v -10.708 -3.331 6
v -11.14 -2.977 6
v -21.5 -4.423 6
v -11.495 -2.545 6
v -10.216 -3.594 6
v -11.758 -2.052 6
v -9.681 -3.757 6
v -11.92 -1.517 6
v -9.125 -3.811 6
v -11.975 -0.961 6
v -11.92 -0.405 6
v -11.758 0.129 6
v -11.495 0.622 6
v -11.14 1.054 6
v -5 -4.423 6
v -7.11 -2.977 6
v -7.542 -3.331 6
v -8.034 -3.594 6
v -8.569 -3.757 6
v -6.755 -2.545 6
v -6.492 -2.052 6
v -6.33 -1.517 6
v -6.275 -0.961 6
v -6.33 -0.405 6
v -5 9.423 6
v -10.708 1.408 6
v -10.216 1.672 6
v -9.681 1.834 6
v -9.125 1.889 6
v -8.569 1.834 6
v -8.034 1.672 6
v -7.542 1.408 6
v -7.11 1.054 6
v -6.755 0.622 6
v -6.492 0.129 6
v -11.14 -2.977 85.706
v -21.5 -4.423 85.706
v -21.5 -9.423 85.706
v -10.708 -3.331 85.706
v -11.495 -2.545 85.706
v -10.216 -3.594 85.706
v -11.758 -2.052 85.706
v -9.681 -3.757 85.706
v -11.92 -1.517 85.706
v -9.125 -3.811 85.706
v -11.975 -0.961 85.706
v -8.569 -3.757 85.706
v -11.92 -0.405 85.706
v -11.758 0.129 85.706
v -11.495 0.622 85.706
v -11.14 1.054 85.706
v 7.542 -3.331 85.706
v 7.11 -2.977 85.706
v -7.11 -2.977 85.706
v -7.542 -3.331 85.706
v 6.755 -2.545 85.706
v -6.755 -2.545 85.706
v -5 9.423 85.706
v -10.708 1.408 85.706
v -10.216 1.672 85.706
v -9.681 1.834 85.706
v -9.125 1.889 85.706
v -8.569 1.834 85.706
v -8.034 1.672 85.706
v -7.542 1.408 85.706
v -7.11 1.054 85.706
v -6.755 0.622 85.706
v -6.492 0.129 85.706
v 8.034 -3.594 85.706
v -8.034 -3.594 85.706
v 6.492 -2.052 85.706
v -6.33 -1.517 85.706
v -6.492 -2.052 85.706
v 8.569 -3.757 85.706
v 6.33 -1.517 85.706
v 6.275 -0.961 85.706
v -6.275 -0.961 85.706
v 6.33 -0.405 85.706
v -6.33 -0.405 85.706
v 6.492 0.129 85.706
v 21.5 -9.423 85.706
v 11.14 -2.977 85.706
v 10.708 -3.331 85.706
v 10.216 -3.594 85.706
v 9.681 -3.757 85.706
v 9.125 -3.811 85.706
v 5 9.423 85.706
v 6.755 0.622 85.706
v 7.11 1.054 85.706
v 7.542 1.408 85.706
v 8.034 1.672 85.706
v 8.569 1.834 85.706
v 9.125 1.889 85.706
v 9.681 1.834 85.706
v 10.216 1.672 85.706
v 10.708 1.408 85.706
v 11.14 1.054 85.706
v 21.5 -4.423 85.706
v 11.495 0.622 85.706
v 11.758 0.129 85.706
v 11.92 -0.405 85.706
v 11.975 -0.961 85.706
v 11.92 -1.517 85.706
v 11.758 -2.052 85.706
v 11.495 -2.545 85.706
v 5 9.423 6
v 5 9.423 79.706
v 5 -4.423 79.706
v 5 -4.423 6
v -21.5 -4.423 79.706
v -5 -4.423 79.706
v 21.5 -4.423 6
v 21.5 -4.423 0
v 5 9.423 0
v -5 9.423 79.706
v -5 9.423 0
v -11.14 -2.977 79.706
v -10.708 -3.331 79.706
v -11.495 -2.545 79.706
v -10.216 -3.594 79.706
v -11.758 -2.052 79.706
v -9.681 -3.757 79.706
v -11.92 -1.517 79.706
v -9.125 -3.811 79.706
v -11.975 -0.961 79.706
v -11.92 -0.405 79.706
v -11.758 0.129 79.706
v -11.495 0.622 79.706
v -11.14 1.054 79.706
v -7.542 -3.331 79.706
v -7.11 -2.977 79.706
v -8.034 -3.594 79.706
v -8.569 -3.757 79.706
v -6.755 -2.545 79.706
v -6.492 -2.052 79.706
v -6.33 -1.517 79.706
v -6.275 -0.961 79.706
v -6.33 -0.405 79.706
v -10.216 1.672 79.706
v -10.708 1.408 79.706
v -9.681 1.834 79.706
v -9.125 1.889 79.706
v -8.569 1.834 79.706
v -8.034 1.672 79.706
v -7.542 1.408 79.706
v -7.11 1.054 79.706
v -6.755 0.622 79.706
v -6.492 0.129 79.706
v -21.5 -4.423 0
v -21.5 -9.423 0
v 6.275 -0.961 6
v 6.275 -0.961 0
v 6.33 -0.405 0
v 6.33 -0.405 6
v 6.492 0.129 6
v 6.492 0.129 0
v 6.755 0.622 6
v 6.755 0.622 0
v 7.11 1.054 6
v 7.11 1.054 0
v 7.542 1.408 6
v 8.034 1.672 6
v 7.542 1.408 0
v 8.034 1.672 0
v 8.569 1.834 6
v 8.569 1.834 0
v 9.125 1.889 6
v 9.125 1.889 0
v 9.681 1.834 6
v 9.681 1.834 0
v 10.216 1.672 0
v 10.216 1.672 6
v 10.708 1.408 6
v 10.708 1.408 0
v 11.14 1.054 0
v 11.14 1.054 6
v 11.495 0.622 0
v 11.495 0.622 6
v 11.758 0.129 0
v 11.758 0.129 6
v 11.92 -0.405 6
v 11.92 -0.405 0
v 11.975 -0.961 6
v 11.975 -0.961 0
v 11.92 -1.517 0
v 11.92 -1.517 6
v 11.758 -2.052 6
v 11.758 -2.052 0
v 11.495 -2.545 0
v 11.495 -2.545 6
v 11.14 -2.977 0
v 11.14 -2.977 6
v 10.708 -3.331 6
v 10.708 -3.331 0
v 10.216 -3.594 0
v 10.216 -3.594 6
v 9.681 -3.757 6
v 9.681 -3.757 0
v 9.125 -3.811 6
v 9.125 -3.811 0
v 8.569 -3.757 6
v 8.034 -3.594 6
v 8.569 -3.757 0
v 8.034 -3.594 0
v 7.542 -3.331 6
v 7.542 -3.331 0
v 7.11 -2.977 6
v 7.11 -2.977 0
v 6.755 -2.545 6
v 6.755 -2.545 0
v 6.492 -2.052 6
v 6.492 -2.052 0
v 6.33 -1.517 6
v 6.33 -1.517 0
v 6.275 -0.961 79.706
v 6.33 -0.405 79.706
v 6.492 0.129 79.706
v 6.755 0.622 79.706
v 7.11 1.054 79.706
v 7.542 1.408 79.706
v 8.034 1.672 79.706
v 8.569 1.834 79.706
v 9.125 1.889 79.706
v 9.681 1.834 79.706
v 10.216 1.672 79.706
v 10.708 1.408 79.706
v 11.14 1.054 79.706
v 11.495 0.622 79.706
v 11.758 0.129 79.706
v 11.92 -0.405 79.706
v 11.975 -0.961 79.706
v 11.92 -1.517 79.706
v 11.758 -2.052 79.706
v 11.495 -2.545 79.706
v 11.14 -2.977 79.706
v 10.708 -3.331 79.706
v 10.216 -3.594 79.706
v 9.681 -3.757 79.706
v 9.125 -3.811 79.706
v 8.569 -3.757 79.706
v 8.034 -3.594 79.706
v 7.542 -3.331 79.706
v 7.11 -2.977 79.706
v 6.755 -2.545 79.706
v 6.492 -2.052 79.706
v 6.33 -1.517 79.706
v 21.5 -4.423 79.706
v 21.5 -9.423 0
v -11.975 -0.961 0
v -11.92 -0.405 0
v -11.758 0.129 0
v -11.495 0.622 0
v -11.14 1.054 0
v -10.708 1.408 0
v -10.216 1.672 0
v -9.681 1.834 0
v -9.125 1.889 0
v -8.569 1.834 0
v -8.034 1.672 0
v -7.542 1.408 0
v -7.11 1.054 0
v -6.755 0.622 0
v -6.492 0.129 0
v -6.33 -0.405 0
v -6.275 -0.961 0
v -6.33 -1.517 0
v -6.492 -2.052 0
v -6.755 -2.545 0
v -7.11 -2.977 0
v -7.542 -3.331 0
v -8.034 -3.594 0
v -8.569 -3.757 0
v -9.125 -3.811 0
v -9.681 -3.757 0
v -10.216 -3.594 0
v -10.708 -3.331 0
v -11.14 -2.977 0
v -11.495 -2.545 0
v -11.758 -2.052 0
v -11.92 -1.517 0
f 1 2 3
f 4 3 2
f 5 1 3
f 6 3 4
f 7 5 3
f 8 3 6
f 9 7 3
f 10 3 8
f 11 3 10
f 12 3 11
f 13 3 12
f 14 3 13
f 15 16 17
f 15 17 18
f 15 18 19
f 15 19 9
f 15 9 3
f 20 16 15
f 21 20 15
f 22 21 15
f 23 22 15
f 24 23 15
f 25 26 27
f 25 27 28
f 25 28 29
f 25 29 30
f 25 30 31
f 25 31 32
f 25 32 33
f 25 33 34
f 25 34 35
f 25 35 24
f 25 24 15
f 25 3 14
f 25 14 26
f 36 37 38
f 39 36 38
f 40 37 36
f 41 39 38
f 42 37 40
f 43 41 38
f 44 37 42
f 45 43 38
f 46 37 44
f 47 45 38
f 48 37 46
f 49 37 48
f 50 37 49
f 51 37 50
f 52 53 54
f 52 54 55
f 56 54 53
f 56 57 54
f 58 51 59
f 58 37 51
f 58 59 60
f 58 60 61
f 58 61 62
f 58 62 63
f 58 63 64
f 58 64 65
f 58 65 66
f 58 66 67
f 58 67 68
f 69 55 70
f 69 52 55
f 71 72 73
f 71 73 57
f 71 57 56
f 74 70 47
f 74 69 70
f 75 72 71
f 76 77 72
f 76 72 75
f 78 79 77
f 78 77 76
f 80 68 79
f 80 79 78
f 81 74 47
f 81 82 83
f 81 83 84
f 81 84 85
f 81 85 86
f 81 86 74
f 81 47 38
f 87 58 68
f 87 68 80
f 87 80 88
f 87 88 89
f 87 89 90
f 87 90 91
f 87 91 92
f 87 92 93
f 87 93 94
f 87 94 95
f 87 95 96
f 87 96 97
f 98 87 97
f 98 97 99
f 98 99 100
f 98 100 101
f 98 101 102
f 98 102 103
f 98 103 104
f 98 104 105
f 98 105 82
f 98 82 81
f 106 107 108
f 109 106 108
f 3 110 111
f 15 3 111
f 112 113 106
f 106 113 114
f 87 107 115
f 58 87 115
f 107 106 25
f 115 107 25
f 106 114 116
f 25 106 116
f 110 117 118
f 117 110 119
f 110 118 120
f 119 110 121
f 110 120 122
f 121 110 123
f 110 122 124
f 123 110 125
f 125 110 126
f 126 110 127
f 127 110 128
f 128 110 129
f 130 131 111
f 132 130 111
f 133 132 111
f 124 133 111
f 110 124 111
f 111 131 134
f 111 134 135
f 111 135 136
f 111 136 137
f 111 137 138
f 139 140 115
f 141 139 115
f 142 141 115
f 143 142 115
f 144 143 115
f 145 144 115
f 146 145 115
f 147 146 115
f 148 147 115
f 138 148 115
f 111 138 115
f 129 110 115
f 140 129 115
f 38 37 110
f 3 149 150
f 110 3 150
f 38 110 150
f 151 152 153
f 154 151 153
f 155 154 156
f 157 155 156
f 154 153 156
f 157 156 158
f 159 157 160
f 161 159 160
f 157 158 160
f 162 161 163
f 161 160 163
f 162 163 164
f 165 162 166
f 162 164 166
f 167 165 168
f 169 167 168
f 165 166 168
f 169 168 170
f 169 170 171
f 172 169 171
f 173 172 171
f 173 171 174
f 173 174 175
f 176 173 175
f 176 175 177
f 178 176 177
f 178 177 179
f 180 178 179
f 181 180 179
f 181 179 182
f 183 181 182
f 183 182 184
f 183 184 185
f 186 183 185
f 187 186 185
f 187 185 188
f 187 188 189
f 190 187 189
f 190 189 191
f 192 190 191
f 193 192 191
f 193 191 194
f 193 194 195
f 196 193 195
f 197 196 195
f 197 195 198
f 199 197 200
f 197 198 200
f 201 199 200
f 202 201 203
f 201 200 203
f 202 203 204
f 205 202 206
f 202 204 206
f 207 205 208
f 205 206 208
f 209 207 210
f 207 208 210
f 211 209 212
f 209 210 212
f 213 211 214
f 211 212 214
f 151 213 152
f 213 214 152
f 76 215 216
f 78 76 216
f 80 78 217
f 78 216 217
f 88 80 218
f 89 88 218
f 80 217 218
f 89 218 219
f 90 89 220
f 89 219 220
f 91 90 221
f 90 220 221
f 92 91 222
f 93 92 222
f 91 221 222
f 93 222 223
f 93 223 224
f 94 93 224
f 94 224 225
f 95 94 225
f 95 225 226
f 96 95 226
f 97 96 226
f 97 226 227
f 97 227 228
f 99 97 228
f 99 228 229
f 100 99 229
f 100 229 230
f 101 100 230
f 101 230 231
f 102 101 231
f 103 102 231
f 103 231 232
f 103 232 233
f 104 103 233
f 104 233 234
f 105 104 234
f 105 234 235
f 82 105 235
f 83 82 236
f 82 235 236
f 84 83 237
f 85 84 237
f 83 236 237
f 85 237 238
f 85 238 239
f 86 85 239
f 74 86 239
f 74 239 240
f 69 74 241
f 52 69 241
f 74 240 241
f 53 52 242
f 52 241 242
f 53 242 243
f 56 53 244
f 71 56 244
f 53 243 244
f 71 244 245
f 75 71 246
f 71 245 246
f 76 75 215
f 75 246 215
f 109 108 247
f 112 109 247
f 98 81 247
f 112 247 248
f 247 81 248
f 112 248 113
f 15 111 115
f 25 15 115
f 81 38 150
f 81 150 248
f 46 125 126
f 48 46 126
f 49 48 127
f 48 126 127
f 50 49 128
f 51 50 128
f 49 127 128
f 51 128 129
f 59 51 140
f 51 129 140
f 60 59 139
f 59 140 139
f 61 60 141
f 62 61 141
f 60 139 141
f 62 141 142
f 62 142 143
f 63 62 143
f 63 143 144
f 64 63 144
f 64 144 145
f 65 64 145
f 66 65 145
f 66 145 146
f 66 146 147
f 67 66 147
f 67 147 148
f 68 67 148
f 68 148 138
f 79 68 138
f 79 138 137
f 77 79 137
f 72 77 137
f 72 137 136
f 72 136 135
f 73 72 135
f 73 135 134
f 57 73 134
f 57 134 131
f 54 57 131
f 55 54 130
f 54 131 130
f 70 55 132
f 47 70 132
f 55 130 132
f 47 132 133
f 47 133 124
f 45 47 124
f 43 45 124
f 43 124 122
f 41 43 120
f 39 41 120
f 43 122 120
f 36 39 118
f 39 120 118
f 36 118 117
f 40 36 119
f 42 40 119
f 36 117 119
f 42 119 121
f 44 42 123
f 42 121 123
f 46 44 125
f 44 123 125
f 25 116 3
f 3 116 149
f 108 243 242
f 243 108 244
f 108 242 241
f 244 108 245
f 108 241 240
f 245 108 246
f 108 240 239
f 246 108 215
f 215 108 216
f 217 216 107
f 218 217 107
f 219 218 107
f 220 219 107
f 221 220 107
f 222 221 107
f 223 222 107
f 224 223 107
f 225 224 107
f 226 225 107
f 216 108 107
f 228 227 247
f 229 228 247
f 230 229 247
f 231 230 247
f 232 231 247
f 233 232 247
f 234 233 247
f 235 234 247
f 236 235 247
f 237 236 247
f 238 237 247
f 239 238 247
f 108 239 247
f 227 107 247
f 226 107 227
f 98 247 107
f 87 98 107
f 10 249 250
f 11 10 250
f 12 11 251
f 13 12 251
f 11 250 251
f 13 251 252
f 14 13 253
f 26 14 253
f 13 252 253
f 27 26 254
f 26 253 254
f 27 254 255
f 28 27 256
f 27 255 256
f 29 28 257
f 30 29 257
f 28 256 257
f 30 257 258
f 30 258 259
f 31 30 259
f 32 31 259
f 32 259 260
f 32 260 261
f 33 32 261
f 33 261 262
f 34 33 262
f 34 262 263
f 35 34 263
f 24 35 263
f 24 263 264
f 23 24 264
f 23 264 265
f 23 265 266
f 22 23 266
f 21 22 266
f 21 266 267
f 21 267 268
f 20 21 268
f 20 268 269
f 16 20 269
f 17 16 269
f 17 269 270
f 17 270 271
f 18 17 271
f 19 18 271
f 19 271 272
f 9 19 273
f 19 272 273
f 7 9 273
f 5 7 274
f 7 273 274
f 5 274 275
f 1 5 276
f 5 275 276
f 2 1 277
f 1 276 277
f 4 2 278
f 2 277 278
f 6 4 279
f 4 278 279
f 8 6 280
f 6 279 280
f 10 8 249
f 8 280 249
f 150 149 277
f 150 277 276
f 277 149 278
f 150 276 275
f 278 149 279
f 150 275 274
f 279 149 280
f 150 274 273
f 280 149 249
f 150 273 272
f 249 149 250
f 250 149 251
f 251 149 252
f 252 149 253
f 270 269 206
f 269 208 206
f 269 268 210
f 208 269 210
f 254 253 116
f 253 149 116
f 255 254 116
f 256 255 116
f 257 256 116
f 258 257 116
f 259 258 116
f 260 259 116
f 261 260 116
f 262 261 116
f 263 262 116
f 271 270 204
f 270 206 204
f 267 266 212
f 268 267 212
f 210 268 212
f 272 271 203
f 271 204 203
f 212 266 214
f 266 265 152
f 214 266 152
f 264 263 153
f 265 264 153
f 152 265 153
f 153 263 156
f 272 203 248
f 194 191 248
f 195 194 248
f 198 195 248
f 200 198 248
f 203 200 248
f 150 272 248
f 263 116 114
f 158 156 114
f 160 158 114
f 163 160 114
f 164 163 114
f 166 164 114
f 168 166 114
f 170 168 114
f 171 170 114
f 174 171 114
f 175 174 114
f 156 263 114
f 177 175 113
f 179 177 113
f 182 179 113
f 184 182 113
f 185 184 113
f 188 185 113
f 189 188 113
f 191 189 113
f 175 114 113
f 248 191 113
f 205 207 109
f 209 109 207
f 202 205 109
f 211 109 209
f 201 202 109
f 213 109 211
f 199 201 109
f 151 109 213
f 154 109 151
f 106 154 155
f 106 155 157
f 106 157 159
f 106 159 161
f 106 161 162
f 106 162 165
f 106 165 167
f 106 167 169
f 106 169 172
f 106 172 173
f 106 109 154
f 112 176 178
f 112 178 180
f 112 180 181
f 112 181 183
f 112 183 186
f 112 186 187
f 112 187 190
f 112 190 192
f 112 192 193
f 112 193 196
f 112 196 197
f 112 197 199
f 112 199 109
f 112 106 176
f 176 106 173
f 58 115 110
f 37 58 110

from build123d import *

# Parameters (mm, degrees)
SKETCH1_R           = 2.85
BOSS_EXTRUDE1_DEPTH = 85.7063165
CUT_EXTRUDE1_START  = -6
CUT_EXTRUDE1_DEPTH  = 73.706316
SKETCH3_R           = 2.85
CUT_EXTRUDE2_DEPTH  = 86.7063165


with BuildPart() as part:
    # Sketch1 → Boss-Extrude1 (new body)
    with BuildSketch(Plane.XY):
        Polygon((-21.5, -9.422571957), (21.5, -9.422571957), (21.5, -4.422571957), (5, 9.422571957), (-5, 9.422571957), (-21.5, -4.422571957), align=None)
        with Locations((-9.125, -0.961285979)):
            Circle(SKETCH1_R, mode=Mode.SUBTRACT)
        with Locations((9.125, -0.961285979)):
            Circle(SKETCH1_R, mode=Mode.SUBTRACT)
        with Locations((-9.125, -0.961285979)):
            Circle(SKETCH1_R)
        with Locations((9.125, -0.961285979)):
            Circle(SKETCH1_R)
    extrude(amount=BOSS_EXTRUDE1_DEPTH)

    # Sketch2 → Cut-Extrude1 (cut)
    with BuildSketch(Plane(origin=(0, 0, 0), x_dir=(-1, 0, 0), z_dir=(0, 0, -1)).offset(CUT_EXTRUDE1_START)):
        Polygon((5, 9.422571957), (21.5, -4.422571957), (5, -4.422571957), align=None)
        Polygon((-21.5, -4.422571957), (-5, 9.422571957), (-5, -4.422571957), align=None)
    extrude(amount=-CUT_EXTRUDE1_DEPTH, mode=Mode.SUBTRACT)

    # Sketch3 → Cut-Extrude2 (cut, through all)
    with BuildSketch(Plane(origin=(0, 0, 0), x_dir=(-1, 0, 0), z_dir=(0, 0, -1))):
        with Locations((9.125, -0.961285979)):
            Circle(SKETCH3_R)
        with Locations((-9.125, -0.961285979)):
            Circle(SKETCH3_R)
    extrude(amount=-CUT_EXTRUDE2_DEPTH, mode=Mode.SUBTRACT)


solid = part.part
